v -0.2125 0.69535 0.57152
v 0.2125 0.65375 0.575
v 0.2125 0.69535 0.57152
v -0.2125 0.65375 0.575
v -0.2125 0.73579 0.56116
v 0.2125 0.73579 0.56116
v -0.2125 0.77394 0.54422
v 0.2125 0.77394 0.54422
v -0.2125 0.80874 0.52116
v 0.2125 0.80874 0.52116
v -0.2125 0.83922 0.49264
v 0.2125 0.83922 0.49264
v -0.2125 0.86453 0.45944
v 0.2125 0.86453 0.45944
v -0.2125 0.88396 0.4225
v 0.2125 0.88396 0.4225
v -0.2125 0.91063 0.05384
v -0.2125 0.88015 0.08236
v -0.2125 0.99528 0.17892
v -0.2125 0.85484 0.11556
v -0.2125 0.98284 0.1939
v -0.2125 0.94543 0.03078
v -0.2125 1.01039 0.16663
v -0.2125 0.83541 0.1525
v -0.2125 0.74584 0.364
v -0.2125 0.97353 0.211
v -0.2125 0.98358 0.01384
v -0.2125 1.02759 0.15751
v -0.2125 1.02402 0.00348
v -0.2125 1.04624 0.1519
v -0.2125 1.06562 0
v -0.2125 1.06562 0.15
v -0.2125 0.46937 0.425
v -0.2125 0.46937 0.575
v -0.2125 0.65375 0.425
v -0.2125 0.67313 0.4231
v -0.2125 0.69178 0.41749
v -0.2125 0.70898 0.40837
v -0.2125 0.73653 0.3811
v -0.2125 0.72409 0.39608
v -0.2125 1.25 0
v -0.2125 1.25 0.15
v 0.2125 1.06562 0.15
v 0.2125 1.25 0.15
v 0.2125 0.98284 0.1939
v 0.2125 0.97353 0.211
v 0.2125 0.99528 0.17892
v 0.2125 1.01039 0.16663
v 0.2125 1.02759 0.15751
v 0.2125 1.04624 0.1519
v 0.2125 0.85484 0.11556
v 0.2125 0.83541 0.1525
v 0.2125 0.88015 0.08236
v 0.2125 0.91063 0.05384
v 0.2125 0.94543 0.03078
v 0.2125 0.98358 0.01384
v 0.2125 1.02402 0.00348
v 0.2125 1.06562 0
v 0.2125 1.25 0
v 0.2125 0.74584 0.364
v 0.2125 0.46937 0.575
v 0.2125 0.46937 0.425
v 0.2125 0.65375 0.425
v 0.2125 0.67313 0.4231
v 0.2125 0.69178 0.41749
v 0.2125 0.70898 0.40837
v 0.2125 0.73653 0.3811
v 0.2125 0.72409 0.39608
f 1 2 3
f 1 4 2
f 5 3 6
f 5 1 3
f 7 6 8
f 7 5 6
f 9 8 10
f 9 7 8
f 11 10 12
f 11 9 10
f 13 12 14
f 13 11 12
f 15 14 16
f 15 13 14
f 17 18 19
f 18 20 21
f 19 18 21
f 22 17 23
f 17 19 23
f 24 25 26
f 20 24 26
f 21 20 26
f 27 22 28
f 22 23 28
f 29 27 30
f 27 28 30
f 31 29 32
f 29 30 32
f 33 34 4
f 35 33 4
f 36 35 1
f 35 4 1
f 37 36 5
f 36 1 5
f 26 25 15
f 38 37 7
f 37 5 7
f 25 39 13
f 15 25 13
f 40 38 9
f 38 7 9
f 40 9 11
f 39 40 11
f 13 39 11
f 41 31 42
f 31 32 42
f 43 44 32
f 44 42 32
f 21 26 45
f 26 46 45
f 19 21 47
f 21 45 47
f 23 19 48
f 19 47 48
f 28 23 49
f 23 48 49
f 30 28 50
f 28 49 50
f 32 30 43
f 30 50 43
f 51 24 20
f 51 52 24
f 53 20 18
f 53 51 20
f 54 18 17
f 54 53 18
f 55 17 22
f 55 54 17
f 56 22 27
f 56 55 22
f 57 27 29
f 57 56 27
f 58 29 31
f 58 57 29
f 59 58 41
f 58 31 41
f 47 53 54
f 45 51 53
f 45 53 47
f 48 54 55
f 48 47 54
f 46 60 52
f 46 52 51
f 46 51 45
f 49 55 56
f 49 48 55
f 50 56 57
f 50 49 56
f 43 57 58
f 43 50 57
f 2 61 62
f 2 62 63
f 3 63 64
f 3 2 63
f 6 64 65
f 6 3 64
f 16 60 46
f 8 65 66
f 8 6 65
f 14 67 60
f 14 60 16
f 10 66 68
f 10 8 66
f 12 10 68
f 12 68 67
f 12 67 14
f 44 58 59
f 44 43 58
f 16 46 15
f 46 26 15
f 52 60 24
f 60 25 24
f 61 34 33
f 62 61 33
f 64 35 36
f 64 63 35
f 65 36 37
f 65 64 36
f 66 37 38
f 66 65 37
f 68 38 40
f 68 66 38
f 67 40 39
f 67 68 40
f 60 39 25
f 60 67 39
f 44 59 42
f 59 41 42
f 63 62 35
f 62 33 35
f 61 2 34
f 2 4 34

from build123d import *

# Parameters (mm, degrees)
PAD001_DEPTH            = 0.2125
FILLET_R                = 0.1
FILLET001_R             = 0.25
BODY001_PLACEMENT_ANGLE = 180


with BuildPart() as part:
    # Sketch001 → Pad001 (new body, symmetric)
    with BuildSketch(Plane.YZ):
        Polygon((-0.469369, 0.425), (-0.72, 0.425), (-0.9, 0), (-1.25, 0), (-1.25, 0.15), (-0.999369, 0.15), (-0.819369, 0.575), (-0.469369, 0.575), align=None)
    extrude(amount=PAD001_DEPTH, both=True)

    # Fillet
    fillet_edges = [part.edges().sort_by_distance(p)[0] for p in [
        (0, -0.999369, 0.15),
        (0, -0.72, 0.425),
    ]]
    fillet(fillet_edges, radius=FILLET_R)

    # Fillet001
    fillet001_edges = [part.edges().sort_by_distance(p)[0] for p in [
        (0, -0.9, 0),
        (0, -0.819369, 0.575),
    ]]
    fillet(fillet001_edges, radius=FILLET001_R)


with BuildPart() as part_1:
    # Body001 placement: moved
    add(part.part.rotate(Axis((0, 0, 0), (0, 0, 1)), BODY001_PLACEMENT_ANGLE))


solid = part_1.part
